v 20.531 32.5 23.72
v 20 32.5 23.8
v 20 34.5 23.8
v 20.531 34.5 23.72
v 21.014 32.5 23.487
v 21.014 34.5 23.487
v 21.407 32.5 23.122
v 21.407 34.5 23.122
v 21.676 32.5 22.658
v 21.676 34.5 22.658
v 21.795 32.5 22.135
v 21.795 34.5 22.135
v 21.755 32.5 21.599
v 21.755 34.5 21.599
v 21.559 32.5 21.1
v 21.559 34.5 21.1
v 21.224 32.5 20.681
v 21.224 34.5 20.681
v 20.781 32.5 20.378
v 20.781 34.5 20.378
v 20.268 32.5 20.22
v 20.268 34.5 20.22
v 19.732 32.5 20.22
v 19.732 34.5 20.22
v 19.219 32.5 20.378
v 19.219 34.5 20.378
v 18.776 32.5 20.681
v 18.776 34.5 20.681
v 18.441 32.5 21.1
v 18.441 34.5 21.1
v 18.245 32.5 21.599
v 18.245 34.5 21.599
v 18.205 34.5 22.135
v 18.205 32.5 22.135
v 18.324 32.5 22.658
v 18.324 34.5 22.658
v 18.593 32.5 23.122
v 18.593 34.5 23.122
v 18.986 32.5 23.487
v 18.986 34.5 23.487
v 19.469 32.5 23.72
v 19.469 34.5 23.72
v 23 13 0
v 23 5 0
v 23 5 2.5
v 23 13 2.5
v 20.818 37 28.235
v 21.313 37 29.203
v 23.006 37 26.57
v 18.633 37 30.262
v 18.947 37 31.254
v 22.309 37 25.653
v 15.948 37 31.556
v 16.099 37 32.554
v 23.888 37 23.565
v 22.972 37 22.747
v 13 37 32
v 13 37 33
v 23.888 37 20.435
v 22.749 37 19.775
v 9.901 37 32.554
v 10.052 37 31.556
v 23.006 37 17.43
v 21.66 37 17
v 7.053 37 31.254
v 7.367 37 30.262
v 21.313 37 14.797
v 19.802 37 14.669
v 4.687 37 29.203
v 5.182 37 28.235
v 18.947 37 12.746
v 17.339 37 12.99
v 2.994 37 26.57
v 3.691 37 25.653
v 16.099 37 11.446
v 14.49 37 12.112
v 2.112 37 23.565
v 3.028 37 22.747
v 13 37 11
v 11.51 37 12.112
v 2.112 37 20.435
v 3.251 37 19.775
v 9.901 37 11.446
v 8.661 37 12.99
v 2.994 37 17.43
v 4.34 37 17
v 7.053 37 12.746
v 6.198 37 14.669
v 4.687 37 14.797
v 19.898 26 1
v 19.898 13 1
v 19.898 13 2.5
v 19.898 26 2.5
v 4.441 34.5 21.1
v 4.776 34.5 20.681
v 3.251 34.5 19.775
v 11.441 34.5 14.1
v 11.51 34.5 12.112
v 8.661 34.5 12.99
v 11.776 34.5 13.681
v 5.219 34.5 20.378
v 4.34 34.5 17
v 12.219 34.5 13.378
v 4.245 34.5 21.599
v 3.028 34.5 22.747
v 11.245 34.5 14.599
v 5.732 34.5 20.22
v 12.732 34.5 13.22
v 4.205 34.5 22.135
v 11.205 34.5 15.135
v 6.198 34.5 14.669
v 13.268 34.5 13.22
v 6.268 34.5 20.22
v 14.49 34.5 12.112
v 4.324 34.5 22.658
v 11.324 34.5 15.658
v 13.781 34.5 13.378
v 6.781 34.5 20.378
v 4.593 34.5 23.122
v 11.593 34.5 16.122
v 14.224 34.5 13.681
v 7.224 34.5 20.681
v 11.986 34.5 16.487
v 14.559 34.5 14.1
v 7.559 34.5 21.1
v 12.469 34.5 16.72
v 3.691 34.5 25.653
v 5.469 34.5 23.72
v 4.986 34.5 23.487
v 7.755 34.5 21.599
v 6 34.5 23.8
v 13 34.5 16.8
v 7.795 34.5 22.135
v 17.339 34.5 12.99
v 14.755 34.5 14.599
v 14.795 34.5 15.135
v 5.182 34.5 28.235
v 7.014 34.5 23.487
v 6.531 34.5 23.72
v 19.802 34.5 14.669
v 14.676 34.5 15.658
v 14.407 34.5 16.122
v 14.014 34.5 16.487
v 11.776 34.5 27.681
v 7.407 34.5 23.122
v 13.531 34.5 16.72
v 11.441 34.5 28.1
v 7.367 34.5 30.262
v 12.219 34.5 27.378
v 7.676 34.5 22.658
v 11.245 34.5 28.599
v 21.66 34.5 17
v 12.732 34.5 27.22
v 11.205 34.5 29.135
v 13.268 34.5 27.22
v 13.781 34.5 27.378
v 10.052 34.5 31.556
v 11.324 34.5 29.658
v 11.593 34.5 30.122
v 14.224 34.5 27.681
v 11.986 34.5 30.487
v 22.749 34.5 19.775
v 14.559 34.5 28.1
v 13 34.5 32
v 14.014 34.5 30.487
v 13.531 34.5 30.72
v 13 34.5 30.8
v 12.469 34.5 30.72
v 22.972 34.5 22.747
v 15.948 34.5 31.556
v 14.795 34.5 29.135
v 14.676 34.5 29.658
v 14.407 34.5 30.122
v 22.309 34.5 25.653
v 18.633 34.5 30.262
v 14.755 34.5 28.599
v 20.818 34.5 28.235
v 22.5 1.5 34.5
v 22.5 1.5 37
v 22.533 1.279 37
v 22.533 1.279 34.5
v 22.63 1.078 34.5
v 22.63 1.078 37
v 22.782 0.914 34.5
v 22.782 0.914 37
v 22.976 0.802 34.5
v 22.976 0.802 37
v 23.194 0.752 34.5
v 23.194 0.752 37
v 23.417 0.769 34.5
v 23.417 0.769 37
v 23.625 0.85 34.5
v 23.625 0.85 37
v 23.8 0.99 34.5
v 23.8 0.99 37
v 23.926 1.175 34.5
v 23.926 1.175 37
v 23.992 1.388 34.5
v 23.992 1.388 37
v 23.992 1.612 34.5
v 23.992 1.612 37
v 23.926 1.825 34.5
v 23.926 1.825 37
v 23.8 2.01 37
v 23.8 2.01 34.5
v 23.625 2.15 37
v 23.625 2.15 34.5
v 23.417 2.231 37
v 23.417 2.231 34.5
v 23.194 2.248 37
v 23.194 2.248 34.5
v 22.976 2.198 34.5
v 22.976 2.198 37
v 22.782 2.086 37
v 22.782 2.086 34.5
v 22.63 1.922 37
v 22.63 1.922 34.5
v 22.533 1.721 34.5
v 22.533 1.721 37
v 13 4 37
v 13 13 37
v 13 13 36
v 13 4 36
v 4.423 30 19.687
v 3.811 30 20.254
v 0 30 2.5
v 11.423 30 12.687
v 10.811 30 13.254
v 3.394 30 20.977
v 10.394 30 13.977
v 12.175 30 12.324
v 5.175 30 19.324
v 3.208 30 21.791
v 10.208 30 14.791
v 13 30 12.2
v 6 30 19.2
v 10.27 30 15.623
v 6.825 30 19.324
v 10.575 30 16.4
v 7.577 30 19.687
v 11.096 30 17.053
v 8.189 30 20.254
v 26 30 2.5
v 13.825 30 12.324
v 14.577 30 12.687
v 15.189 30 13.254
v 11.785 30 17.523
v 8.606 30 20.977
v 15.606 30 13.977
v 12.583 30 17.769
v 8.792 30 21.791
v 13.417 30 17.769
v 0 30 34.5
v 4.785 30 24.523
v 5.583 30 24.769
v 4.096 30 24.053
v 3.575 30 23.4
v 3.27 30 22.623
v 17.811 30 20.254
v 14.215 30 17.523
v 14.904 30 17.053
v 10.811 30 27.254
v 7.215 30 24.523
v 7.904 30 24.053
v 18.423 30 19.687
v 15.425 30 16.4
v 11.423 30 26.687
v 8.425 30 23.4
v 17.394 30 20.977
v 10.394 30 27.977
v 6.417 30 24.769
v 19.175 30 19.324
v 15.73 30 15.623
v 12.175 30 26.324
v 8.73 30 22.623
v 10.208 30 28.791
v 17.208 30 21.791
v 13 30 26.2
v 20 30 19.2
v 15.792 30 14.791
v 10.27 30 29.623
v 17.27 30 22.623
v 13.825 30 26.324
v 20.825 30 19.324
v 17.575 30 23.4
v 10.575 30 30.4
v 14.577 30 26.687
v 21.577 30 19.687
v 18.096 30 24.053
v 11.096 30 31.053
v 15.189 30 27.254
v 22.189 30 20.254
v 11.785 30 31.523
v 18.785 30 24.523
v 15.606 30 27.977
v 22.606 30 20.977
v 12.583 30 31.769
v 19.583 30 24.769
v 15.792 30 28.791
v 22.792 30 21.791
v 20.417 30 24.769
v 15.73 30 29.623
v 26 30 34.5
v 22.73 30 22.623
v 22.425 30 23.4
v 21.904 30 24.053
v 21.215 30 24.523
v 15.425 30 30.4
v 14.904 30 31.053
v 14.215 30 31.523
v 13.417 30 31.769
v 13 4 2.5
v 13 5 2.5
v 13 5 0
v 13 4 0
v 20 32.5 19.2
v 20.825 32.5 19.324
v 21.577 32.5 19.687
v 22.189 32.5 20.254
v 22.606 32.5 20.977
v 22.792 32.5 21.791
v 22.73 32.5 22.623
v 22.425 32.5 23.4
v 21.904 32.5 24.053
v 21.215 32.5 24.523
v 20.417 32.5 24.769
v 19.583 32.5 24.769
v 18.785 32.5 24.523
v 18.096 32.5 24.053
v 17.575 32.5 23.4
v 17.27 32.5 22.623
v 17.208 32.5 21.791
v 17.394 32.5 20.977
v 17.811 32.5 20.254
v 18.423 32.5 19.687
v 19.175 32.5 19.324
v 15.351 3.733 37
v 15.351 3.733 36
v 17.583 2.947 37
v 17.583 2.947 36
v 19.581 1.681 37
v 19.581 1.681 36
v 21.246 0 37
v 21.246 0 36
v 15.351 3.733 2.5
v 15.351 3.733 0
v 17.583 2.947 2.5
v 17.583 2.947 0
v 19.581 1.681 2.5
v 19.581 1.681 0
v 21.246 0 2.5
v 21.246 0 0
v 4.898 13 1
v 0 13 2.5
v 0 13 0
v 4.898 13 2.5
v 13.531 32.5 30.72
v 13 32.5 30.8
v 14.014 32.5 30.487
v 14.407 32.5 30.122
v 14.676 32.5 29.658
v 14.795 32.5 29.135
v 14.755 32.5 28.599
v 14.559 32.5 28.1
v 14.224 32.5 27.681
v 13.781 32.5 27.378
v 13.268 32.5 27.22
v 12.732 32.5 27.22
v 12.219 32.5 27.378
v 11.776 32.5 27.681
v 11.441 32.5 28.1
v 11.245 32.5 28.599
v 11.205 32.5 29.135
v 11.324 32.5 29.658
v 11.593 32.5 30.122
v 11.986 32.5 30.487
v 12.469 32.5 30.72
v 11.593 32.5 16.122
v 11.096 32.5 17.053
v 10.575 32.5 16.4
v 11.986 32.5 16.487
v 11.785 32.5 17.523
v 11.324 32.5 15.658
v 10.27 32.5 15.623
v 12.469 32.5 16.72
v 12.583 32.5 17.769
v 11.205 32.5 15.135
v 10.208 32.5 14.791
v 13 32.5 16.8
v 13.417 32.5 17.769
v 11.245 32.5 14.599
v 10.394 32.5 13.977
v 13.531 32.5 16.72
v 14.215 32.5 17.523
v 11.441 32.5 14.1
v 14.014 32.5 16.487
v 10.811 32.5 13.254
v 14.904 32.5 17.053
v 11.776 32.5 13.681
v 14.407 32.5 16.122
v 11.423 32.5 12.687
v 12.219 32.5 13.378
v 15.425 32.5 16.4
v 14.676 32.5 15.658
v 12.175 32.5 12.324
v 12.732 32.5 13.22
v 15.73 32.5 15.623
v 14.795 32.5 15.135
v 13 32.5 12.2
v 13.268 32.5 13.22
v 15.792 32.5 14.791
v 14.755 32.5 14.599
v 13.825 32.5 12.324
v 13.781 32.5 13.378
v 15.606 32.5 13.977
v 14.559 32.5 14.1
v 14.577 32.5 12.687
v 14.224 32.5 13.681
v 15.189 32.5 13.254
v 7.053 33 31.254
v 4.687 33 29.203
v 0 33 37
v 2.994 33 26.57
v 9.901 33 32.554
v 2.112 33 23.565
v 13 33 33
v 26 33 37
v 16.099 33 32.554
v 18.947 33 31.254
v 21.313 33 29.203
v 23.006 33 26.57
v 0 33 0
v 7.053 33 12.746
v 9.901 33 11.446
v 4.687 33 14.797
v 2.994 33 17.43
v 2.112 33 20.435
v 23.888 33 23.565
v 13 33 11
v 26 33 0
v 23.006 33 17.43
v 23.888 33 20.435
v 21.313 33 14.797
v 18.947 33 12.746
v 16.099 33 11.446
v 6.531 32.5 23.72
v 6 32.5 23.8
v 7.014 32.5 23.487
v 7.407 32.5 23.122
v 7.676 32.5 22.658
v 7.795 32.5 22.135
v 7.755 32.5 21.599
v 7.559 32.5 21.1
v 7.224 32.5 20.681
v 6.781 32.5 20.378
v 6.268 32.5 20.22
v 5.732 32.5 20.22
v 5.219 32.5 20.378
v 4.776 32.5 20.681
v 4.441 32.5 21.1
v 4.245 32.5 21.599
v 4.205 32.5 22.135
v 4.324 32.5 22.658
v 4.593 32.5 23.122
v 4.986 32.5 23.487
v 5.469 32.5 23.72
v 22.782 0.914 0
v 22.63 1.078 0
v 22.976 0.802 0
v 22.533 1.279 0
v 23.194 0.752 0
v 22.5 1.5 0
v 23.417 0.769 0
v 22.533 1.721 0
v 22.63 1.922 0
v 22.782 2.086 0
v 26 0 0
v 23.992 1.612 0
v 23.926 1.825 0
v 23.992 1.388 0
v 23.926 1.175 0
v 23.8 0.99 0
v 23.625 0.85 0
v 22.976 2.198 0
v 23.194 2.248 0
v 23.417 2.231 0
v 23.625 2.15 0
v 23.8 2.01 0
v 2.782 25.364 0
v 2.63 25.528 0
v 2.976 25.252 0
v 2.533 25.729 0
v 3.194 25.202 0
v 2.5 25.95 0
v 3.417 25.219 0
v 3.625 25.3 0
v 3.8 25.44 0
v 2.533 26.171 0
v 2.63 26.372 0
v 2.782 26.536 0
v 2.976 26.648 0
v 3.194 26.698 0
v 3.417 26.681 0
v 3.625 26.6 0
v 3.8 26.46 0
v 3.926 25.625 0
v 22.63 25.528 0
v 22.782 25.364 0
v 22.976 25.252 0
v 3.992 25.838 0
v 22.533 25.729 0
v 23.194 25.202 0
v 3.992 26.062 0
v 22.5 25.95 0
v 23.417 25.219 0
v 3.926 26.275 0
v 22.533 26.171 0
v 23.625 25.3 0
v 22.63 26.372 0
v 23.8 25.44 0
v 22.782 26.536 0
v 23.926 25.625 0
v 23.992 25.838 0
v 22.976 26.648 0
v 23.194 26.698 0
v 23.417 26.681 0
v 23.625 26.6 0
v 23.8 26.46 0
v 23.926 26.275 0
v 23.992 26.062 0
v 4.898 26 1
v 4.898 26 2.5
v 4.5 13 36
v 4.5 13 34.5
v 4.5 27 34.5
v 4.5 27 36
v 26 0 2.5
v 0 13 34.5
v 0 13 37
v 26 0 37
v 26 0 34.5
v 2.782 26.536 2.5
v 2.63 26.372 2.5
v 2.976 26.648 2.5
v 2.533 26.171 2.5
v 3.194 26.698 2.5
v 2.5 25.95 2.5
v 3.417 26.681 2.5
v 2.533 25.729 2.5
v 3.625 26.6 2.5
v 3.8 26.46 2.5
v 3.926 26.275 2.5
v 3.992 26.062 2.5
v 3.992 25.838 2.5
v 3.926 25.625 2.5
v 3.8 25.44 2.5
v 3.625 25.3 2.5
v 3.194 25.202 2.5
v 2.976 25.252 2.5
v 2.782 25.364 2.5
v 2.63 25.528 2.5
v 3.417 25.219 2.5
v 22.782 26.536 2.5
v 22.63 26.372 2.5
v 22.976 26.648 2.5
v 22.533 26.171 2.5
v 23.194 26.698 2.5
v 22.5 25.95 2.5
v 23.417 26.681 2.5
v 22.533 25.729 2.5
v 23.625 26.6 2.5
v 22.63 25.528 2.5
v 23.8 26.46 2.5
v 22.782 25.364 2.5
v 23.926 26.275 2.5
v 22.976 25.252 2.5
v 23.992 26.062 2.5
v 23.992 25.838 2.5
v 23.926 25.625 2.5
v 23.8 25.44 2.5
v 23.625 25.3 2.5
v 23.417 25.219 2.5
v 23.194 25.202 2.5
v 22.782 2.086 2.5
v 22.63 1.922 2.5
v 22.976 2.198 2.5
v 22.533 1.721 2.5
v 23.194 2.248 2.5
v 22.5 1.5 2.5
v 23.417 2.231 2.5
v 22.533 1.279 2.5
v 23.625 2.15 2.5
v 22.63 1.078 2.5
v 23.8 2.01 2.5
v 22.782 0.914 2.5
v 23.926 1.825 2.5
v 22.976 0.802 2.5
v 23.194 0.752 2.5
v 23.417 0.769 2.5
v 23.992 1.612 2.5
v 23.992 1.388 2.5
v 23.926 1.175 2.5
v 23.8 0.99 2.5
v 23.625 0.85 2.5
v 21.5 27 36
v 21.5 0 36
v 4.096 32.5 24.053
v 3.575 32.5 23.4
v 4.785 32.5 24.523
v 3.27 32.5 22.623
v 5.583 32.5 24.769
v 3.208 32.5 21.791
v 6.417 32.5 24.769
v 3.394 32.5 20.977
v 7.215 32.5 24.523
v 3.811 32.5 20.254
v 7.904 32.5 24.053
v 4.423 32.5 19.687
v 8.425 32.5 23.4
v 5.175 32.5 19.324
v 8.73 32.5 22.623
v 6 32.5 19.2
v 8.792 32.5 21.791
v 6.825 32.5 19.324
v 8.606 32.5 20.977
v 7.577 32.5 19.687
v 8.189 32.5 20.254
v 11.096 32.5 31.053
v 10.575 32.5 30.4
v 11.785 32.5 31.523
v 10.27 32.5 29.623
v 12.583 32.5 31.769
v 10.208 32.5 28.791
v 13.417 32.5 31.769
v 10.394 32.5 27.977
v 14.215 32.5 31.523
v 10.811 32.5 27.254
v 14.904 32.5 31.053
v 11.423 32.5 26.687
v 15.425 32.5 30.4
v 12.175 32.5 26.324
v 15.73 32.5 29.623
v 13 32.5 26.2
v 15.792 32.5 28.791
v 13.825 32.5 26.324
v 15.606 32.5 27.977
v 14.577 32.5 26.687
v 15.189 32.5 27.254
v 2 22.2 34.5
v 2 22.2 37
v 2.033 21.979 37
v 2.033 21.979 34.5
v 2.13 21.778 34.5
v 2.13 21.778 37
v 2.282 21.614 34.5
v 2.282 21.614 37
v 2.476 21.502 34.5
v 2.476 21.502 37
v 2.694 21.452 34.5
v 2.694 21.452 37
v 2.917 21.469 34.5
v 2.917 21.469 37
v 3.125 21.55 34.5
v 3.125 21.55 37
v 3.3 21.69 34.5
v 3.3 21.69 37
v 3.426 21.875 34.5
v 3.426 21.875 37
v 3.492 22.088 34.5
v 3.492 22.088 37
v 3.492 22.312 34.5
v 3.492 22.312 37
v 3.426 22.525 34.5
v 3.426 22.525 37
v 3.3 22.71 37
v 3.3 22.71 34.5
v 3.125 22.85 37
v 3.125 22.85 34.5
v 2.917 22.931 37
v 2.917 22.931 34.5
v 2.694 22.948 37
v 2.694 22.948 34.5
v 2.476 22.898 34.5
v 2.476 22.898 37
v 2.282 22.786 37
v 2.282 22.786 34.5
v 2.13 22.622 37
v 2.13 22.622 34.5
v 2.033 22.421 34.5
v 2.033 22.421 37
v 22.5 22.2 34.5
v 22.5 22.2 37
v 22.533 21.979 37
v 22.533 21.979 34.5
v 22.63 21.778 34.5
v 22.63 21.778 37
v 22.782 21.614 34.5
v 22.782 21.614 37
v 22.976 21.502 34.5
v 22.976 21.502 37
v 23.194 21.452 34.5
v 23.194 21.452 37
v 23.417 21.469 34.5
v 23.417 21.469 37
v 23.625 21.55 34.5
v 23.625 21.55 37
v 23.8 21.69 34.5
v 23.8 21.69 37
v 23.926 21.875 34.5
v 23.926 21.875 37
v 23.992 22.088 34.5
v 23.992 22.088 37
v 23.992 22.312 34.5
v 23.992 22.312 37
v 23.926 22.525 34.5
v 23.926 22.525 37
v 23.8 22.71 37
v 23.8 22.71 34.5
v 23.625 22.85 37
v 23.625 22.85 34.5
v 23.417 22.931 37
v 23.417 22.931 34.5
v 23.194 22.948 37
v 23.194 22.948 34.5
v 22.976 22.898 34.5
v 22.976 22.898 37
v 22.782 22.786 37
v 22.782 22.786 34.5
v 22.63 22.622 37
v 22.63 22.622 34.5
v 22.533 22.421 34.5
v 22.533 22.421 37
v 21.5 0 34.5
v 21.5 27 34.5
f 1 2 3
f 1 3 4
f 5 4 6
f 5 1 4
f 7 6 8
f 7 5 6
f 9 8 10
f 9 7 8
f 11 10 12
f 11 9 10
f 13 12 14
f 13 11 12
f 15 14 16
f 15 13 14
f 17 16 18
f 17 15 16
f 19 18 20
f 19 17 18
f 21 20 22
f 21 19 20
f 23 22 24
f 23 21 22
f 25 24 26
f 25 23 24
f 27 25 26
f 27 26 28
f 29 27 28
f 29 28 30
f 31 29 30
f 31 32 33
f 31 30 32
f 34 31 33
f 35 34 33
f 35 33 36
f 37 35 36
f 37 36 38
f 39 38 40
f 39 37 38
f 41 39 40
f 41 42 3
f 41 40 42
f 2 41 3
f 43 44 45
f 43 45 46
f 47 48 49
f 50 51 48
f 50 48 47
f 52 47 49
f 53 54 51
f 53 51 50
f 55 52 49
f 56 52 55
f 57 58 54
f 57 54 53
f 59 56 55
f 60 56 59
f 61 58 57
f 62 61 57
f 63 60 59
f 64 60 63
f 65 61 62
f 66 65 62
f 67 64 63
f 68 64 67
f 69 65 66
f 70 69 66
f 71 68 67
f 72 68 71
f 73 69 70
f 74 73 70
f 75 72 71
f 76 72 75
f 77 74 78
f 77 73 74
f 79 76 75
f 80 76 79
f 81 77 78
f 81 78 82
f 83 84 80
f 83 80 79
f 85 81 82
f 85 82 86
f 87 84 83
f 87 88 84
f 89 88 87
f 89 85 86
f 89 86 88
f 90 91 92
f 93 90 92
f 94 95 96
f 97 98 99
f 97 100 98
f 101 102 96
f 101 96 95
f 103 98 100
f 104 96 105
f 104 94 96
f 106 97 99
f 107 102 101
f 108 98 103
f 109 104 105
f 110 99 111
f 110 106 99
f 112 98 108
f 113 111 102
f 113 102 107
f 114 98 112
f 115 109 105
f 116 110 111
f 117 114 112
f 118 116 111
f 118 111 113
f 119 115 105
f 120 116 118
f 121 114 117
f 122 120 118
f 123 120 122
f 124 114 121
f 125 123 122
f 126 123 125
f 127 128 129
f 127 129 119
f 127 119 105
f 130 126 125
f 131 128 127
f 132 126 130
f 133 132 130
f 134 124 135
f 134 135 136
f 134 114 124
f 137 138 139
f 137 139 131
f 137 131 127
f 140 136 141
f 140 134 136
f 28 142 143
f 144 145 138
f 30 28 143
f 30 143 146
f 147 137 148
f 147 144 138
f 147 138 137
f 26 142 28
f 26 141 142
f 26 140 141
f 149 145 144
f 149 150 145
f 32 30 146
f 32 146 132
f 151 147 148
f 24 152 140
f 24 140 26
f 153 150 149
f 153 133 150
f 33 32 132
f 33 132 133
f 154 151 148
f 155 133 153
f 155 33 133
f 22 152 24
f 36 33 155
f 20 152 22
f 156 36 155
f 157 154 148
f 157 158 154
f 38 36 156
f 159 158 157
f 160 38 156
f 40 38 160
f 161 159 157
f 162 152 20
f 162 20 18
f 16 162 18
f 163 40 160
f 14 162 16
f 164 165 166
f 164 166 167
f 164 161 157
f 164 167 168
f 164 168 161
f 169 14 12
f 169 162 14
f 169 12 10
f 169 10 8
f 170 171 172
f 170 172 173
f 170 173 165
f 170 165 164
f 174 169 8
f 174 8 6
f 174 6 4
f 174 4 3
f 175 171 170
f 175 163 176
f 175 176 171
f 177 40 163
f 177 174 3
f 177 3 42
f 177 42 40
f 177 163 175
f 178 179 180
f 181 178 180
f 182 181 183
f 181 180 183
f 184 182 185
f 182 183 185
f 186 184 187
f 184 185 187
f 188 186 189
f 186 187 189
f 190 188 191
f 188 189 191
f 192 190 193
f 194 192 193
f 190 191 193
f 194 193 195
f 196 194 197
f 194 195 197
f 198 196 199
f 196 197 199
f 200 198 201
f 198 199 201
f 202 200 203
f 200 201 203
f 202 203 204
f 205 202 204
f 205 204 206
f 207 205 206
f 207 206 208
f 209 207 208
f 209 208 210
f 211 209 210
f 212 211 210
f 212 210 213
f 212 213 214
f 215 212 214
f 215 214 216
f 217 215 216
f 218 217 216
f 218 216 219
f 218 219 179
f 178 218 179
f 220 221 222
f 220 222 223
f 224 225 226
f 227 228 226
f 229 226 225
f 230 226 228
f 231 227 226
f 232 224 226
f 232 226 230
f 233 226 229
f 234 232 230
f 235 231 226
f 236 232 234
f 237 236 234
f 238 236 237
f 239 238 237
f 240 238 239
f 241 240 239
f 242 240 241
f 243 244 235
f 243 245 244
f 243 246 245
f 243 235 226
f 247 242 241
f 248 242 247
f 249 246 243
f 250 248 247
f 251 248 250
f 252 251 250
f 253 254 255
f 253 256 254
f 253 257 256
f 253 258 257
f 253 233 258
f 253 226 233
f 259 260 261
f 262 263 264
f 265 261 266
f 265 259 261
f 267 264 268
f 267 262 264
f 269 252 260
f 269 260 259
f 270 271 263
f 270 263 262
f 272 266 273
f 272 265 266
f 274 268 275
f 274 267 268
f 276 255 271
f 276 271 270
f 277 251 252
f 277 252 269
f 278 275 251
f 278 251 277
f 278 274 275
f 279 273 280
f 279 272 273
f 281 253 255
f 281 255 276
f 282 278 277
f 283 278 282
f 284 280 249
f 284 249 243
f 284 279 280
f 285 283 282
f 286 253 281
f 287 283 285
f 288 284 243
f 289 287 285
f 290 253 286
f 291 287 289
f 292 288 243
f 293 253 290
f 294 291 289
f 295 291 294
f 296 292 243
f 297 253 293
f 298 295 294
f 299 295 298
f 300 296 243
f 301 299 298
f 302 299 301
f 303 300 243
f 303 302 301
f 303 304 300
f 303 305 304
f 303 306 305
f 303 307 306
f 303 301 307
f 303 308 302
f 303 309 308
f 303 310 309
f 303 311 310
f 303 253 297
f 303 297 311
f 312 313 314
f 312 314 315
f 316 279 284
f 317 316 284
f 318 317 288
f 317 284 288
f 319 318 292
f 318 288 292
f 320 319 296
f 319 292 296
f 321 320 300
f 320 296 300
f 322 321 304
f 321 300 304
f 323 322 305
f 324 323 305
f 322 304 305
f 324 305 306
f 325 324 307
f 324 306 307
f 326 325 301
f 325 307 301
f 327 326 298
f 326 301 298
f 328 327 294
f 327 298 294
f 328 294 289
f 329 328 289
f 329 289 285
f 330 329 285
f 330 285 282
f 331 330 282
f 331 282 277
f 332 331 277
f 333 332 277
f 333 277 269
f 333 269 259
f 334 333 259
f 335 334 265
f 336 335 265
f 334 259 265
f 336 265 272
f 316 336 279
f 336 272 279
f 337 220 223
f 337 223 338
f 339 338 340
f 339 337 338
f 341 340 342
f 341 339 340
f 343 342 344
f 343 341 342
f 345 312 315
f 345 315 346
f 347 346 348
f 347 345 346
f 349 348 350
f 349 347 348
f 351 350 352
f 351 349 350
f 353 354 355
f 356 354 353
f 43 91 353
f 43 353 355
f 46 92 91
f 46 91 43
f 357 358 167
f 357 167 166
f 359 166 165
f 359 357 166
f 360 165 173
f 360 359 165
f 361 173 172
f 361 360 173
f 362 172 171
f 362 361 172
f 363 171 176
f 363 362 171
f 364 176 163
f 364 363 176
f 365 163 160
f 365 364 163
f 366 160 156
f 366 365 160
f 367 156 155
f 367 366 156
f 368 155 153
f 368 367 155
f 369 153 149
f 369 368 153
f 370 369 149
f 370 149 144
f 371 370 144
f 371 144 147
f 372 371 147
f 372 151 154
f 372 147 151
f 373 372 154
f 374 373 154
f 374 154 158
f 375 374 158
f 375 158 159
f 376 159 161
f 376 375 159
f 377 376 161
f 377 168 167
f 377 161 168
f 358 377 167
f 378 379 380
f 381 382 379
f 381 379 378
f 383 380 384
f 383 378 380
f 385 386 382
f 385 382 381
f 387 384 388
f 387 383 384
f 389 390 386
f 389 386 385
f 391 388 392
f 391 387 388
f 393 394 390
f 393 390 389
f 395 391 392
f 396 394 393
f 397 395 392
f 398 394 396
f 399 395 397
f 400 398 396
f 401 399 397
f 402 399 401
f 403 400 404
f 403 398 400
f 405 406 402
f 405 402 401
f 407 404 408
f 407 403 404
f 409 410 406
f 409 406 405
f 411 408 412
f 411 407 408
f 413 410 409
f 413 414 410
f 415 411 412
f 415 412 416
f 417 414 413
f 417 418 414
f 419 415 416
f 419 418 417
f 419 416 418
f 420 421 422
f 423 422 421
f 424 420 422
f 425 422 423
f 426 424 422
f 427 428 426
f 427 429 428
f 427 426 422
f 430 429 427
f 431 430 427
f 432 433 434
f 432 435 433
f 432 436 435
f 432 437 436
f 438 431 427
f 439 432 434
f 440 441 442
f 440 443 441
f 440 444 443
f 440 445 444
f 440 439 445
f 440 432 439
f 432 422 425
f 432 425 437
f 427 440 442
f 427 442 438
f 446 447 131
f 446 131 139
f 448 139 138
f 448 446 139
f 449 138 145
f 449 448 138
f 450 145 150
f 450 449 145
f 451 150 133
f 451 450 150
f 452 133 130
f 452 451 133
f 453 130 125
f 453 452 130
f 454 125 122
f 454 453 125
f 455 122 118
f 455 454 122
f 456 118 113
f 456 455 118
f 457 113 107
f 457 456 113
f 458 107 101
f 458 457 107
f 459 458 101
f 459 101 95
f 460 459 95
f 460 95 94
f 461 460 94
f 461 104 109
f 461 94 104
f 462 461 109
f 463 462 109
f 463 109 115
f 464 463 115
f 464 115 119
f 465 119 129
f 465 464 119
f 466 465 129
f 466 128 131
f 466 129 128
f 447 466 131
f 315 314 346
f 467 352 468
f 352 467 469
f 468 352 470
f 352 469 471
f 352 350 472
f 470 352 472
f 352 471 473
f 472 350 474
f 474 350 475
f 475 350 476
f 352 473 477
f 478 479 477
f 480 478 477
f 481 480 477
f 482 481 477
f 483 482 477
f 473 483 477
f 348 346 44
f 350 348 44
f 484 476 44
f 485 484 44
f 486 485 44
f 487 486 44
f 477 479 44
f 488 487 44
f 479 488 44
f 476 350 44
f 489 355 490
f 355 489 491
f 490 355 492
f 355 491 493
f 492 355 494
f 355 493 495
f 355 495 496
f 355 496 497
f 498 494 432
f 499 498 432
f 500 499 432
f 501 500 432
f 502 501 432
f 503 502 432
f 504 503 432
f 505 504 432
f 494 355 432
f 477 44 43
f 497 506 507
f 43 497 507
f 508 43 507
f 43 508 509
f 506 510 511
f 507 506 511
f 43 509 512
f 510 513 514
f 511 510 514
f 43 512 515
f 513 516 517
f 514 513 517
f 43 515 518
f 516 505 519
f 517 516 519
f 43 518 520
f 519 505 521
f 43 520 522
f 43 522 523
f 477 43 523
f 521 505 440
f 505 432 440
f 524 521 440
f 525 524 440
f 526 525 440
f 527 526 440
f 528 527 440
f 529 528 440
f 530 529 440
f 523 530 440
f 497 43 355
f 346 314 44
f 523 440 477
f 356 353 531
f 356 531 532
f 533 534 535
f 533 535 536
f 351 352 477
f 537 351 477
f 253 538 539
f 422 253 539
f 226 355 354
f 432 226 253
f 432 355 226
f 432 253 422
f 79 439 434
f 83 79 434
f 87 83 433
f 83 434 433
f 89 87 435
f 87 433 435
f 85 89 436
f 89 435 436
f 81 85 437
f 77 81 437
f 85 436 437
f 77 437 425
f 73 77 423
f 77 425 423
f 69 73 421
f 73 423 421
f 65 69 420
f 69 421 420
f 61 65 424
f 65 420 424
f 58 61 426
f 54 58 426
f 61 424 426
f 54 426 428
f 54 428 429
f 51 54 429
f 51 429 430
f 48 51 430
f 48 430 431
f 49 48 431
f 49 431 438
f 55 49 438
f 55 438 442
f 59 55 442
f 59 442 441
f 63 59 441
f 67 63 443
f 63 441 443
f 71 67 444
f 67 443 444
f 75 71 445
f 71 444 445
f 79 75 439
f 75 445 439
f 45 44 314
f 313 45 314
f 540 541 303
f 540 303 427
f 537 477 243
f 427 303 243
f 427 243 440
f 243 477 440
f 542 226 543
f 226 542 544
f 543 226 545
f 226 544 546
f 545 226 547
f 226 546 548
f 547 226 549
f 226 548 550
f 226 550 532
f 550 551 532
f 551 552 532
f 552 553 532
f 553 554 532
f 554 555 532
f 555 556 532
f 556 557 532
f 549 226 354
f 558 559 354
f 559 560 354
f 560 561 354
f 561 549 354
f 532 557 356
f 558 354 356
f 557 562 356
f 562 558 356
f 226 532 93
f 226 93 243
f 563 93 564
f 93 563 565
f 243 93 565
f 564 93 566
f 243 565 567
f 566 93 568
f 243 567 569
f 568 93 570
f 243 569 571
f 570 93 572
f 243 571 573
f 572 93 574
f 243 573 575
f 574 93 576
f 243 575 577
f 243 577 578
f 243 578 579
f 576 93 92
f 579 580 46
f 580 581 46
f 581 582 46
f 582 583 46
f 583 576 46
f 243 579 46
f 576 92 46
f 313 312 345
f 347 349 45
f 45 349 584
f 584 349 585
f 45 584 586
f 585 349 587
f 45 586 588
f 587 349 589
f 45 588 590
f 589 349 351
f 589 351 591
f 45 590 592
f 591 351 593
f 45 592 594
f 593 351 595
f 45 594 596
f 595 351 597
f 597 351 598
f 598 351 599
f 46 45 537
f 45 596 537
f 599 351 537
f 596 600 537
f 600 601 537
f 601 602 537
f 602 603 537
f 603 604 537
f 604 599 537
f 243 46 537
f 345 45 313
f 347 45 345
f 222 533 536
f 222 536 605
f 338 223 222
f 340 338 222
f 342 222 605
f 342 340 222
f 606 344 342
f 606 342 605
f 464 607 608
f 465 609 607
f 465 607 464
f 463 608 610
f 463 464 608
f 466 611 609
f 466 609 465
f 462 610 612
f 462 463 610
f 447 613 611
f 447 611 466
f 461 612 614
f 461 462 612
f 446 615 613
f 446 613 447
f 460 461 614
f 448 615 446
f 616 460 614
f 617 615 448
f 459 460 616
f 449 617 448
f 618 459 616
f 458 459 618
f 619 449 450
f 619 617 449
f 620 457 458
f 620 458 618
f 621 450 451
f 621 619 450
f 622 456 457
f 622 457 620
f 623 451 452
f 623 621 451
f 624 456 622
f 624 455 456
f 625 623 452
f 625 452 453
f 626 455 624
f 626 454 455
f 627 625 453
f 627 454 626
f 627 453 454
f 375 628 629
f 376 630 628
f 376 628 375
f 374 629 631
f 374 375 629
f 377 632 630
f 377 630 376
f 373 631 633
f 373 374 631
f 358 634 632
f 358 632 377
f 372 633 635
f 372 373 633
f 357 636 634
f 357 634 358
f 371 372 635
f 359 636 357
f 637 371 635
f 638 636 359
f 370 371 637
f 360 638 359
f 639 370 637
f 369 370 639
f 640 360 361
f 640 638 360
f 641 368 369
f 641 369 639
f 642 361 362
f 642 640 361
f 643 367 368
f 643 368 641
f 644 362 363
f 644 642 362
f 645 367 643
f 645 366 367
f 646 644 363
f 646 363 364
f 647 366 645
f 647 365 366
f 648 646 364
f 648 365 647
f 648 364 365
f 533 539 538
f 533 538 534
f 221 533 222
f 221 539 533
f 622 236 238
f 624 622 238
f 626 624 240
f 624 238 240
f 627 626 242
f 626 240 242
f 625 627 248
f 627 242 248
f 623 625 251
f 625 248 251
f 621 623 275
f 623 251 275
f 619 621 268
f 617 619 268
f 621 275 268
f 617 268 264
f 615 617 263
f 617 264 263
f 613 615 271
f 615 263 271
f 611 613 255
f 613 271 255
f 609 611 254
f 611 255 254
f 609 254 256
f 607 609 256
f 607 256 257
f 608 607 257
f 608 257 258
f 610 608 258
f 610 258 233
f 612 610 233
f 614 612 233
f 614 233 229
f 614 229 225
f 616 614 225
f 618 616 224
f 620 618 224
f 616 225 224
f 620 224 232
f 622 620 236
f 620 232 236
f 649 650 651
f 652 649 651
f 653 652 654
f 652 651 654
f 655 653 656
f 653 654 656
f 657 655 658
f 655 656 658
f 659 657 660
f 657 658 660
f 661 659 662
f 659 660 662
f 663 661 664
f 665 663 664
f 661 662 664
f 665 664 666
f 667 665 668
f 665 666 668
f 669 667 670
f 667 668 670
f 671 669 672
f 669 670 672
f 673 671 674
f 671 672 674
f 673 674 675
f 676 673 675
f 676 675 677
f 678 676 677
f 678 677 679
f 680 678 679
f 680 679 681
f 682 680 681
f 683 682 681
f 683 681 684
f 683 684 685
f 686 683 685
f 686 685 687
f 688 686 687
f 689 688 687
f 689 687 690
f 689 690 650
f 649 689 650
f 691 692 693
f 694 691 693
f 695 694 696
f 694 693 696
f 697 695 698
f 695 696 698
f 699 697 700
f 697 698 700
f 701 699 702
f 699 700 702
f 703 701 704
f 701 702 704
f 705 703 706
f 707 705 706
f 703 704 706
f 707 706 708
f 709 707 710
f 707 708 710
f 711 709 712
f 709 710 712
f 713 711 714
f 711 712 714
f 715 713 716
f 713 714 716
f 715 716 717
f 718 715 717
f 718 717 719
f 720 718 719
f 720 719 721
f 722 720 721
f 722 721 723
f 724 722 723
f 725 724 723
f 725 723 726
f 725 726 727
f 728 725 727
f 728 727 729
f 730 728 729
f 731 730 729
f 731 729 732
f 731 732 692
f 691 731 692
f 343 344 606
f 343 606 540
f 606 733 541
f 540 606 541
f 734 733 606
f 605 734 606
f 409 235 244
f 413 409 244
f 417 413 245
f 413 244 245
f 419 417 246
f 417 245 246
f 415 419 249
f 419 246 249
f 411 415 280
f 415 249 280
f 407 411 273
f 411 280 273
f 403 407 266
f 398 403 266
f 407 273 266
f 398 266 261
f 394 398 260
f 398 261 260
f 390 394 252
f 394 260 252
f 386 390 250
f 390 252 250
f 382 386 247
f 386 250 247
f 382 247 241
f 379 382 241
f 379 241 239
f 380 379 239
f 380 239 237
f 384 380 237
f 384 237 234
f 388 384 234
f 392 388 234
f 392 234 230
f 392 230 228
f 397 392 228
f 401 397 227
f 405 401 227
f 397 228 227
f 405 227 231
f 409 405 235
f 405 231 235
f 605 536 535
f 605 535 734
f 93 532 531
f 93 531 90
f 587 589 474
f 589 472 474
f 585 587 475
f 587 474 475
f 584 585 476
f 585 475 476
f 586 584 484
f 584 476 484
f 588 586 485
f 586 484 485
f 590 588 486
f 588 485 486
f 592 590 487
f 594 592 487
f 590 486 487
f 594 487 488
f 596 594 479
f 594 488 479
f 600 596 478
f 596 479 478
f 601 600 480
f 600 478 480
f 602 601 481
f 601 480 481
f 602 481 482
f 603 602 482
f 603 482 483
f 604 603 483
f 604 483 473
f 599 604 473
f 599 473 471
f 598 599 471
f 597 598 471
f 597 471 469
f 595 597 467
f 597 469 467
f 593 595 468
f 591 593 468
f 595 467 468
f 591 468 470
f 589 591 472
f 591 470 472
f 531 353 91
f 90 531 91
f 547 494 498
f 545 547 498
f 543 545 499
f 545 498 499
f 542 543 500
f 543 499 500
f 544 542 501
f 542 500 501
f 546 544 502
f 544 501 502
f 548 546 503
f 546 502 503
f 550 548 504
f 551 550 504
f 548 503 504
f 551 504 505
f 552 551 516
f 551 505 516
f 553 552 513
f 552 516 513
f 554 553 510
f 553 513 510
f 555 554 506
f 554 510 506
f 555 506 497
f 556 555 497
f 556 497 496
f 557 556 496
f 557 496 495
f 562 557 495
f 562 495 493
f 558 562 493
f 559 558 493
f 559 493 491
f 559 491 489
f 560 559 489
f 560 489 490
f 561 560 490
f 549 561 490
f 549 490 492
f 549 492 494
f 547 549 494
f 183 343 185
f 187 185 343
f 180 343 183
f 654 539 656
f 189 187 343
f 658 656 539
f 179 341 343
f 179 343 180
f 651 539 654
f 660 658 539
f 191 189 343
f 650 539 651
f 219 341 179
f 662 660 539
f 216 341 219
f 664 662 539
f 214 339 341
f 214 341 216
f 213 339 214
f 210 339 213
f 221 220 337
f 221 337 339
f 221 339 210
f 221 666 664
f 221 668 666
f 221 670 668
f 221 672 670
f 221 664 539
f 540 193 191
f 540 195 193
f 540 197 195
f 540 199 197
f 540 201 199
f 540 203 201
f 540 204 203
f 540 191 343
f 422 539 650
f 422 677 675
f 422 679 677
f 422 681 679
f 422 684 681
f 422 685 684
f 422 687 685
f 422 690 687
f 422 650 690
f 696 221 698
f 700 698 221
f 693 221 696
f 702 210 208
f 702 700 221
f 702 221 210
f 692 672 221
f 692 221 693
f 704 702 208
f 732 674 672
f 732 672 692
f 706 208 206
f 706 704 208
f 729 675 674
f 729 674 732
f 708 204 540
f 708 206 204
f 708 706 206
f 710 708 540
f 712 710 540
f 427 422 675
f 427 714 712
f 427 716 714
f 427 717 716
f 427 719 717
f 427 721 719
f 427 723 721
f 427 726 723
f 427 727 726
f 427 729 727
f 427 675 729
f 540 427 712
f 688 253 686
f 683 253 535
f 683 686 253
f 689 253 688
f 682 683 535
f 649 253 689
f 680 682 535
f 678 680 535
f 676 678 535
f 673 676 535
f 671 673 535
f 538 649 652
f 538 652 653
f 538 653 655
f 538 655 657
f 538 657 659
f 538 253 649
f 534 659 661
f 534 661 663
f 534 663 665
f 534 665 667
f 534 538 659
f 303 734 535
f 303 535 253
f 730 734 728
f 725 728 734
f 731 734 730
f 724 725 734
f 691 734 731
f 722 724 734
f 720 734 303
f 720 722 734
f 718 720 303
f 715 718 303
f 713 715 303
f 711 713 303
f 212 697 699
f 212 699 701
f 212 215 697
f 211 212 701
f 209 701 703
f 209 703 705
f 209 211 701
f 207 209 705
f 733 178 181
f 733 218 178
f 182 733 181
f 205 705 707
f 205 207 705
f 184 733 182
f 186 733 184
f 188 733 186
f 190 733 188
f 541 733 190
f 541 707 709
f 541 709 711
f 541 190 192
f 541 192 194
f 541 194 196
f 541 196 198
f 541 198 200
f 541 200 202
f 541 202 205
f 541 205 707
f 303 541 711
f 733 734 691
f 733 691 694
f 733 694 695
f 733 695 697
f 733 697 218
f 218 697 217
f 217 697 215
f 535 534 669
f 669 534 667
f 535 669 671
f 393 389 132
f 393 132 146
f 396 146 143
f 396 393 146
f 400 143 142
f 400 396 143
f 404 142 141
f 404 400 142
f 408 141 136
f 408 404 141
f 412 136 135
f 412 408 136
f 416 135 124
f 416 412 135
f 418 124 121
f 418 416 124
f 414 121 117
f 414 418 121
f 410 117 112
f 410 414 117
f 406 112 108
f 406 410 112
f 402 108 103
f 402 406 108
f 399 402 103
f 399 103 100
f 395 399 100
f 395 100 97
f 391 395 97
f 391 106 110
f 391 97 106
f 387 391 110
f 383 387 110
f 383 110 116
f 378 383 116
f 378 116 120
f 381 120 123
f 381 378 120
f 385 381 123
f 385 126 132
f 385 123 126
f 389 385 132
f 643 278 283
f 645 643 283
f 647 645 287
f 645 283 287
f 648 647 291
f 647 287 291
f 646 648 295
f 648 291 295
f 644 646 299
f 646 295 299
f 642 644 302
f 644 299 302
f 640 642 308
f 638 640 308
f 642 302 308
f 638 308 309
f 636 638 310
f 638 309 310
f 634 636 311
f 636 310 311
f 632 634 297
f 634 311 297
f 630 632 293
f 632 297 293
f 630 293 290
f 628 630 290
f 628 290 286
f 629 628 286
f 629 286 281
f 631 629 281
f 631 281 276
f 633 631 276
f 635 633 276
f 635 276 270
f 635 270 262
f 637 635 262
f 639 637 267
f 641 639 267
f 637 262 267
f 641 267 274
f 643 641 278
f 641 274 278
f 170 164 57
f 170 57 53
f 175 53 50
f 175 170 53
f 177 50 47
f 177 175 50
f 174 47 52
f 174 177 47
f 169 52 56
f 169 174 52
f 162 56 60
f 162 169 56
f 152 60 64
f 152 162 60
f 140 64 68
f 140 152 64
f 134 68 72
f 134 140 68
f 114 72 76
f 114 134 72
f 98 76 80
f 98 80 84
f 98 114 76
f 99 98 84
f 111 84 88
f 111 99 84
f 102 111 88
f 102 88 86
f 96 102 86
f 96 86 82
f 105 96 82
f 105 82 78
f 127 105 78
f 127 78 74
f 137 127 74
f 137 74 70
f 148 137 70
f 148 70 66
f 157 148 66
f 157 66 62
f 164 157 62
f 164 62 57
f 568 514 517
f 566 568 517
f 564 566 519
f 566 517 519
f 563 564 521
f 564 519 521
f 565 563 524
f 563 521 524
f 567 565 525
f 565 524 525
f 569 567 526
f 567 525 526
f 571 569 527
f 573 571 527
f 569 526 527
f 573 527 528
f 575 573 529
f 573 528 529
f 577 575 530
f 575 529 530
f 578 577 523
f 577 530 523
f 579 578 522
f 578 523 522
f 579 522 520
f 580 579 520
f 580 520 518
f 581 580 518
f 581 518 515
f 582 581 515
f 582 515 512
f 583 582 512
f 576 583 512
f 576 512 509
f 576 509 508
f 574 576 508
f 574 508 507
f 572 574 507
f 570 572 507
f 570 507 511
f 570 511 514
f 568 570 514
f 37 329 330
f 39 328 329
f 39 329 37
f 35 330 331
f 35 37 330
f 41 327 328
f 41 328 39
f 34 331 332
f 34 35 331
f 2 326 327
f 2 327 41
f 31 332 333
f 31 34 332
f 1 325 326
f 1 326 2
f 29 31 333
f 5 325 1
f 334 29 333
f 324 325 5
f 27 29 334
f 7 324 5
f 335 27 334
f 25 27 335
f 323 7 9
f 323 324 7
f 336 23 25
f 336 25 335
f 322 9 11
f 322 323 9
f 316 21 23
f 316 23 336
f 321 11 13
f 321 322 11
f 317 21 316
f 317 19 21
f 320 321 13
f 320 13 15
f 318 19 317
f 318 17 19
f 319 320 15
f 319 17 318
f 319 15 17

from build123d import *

# Parameters (mm, degrees)
SKETCH_1_W                      = 26
SKETCH_1_H                      = 33
EXTRUDE_1_DEPTH                 = 37
SKETCH_3_W                      = 26
SKETCH_3_H                      = 32
CUT_EXTRUDE_1_DEPTH             = 30
CUT_EXTRUDE_2_REACH             = 57.982
SKETCH_2_R                      = 0.75
CUT_EXTRUDE_2_DIRECTION_2_DEPTH = 56.982140009
CUT_EXTRUDE_3_REACH             = 57.982
SKETCH_4_R                      = 0.75
SKETCH_5_W                      = 17
SKETCH_5_H                      = 1.5
CUT_EXTRUDE_4_DEPTH             = 27
CUT_EXTRUDE_5_REACH             = 57.982
SKETCH_6_W                      = 20
SKETCH_6_H                      = 8
CUT_EXTRUDE_START               = -37
CUT_EXTRUDE_6_OUTLINE_R         = 0.75
CUT_EXTRUDE_6_DEPTH             = 37
SKETCH_8_W                      = 15
SKETCH_8_H                      = 1.5
CUT_EXTRUDE_7_DEPTH             = 13
SKETCH_9_R                      = 11
SKETCH_9_R_2                    = 10
EXTRUDE_2_DEPTH                 = 4
SKETCH_12_R                     = 10
EXTRUDE_3_DEPTH                 = 1.5
CUT_EXTRUDE_8_DEPTH             = 56.982140009
CUT_EXTRUDE_8_DEPTH_BACK        = 56.982140009
SKETCH_10_R                     = 1.8
SKETCH_11_R                     = 2.8
CUT_EXTRUDE_9_DEPTH             = 2.5


# Read off the part's stored shape, not the designer's step: 切除-拉伸6
with BuildPart() as part:
    # 草图1 → 凸台-拉伸1 (new body)
    with BuildSketch(Plane.XY):
        with Locations((13, 16.5)):
            Rectangle(SKETCH_1_W, SKETCH_1_H)
    extrude(amount=EXTRUDE_1_DEPTH)

    # 草图3 → 切除-拉伸1 (cut)
    with BuildSketch(Plane.XZ):
        with Locations((13, 18.5)):
            Rectangle(SKETCH_3_W, SKETCH_3_H)
    extrude(amount=-CUT_EXTRUDE_1_DEPTH, mode=Mode.SUBTRACT)

    # 草图2 → 切除-拉伸2 (cut, up to next)
    with BuildSketch(Plane.XY.offset(37), mode=Mode.PRIVATE) as cut_extrude_2_sk1:
        with Locations(Location((2.75, 1.5, 0), (0, 0, 180))):
            Circle(SKETCH_2_R)
    cut_extrude_2_tool1 = extrude(cut_extrude_2_sk1.sketch, amount=-CUT_EXTRUDE_2_REACH, mode=Mode.PRIVATE) & part.part
    # 草图2 → 切除-拉伸2 (cut, up to next)
    with BuildSketch(Plane.XY.offset(37), mode=Mode.PRIVATE) as cut_extrude_2_sk2:
        with Locations(Location((23.25, 1.5, 0), (0, 0, 180))):
            Circle(SKETCH_2_R)
    cut_extrude_2_tool2 = extrude(cut_extrude_2_sk2.sketch, amount=-CUT_EXTRUDE_2_REACH, mode=Mode.PRIVATE) & part.part
    # 草图2 → 切除-拉伸2 (cut, up to next)
    with BuildSketch(Plane.XY.offset(37), mode=Mode.PRIVATE) as cut_extrude_2_sk3:
        with Locations(Location((23.25, 22.2, 0), (0, 0, 180))):
            Circle(SKETCH_2_R)
    cut_extrude_2_tool3 = extrude(cut_extrude_2_sk3.sketch, amount=-CUT_EXTRUDE_2_REACH, mode=Mode.PRIVATE) & part.part
    # 草图2 → 切除-拉伸2 (cut, up to next)
    with BuildSketch(Plane.XY.offset(37), mode=Mode.PRIVATE) as cut_extrude_2_sk4:
        with Locations(Location((2.75, 22.2, 0), (0, 0, 180))):
            Circle(SKETCH_2_R)
    cut_extrude_2_tool4 = extrude(cut_extrude_2_sk4.sketch, amount=-CUT_EXTRUDE_2_REACH, mode=Mode.PRIVATE) & part.part
    add(cut_extrude_2_tool1.solids().sort_by_distance((2.75, 1.5, 37))[0], mode=Mode.SUBTRACT)
    add(cut_extrude_2_tool2.solids().sort_by_distance((23.25, 1.5, 37))[0], mode=Mode.SUBTRACT)
    add(cut_extrude_2_tool3.solids().sort_by_distance((23.25, 22.2, 37))[0], mode=Mode.SUBTRACT)
    add(cut_extrude_2_tool4.solids().sort_by_distance((2.75, 22.2, 37))[0], mode=Mode.SUBTRACT)

    # 草图2 → 切除-拉伸2 direction 2 (cut)
    with BuildSketch(Plane.XY.offset(37)):
        with Locations(Location((2.75, 1.5, 0), (0, 0, 180))):
            Circle(SKETCH_2_R)
        with Locations(Location((23.25, 1.5, 0), (0, 0, 180))):
            Circle(SKETCH_2_R)
        with Locations(Location((23.25, 22.2, 0), (0, 0, 180))):
            Circle(SKETCH_2_R)
        with Locations(Location((2.75, 22.2, 0), (0, 0, 180))):
            Circle(SKETCH_2_R)
    extrude(amount=CUT_EXTRUDE_2_DIRECTION_2_DEPTH, mode=Mode.SUBTRACT)

    # 草图4 → 切除-拉伸3 (cut, up to next)
    with BuildSketch(Plane(origin=(0, 0, 0), x_dir=(-1, 0, 0), z_dir=(0, 0, -1)), mode=Mode.PRIVATE) as cut_extrude_3_sk1:
        with Locations((-2.75, 1.5)):
            Circle(SKETCH_4_R)
    cut_extrude_3_tool1 = extrude(cut_extrude_3_sk1.sketch, amount=-CUT_EXTRUDE_3_REACH, mode=Mode.PRIVATE) & part.part
    # 草图4 → 切除-拉伸3 (cut, up to next)
    with BuildSketch(Plane(origin=(0, 0, 0), x_dir=(-1, 0, 0), z_dir=(0, 0, -1)), mode=Mode.PRIVATE) as cut_extrude_3_sk2:
        with Locations((-23.25, 1.5)):
            Circle(SKETCH_4_R)
    cut_extrude_3_tool2 = extrude(cut_extrude_3_sk2.sketch, amount=-CUT_EXTRUDE_3_REACH, mode=Mode.PRIVATE) & part.part
    # 草图4 → 切除-拉伸3 (cut, up to next)
    with BuildSketch(Plane(origin=(0, 0, 0), x_dir=(-1, 0, 0), z_dir=(0, 0, -1)), mode=Mode.PRIVATE) as cut_extrude_3_sk3:
        with Locations((-23.25, 25.95)):
            Circle(SKETCH_4_R)
    cut_extrude_3_tool3 = extrude(cut_extrude_3_sk3.sketch, amount=-CUT_EXTRUDE_3_REACH, mode=Mode.PRIVATE) & part.part
    # 草图4 → 切除-拉伸3 (cut, up to next)
    with BuildSketch(Plane(origin=(0, 0, 0), x_dir=(-1, 0, 0), z_dir=(0, 0, -1)), mode=Mode.PRIVATE) as cut_extrude_3_sk4:
        with Locations((-3.25, 25.95)):
            Circle(SKETCH_4_R)
    cut_extrude_3_tool4 = extrude(cut_extrude_3_sk4.sketch, amount=-CUT_EXTRUDE_3_REACH, mode=Mode.PRIVATE) & part.part
    add(cut_extrude_3_tool1.solids().sort_by_distance((2.75, 1.5, 0))[0], mode=Mode.SUBTRACT)
    add(cut_extrude_3_tool2.solids().sort_by_distance((23.25, 1.5, 0))[0], mode=Mode.SUBTRACT)
    add(cut_extrude_3_tool3.solids().sort_by_distance((23.25, 25.95, 0))[0], mode=Mode.SUBTRACT)
    add(cut_extrude_3_tool4.solids().sort_by_distance((3.25, 25.95, 0))[0], mode=Mode.SUBTRACT)

    # 草图5 → 切除-拉伸4 (cut)
    with BuildSketch(Plane.XZ):
        with Locations((13, 35.25)):
            Rectangle(SKETCH_5_W, SKETCH_5_H)
    extrude(amount=-CUT_EXTRUDE_4_DEPTH, mode=Mode.SUBTRACT)

    # 草图6 → 切除-拉伸5 (cut, up to next)
    with BuildSketch(Plane(origin=(0, 0, 0), x_dir=(-1, 0, 0), z_dir=(0, 0, -1)), mode=Mode.PRIVATE) as cut_extrude_5_sk1:
        with Locations((-13, 9)):
            Rectangle(SKETCH_6_W, SKETCH_6_H)
    cut_extrude_5_tool1 = extrude(cut_extrude_5_sk1.sketch, amount=-CUT_EXTRUDE_5_REACH, mode=Mode.PRIVATE) & part.part
    add(cut_extrude_5_tool1.solids().sort_by_distance((13, 9, 0))[0], mode=Mode.SUBTRACT)

    # 切除-拉伸6 outline → 切除-拉伸6 (cut)
    with BuildSketch(Plane(origin=(0, 0, 0), x_dir=(-1, 0, 0), z_dir=(0, 0, -1)).offset(CUT_EXTRUDE_START)):
        with BuildLine():
            Line((0, 0), (0, 13))
            Line((0, 13), (-13, 13))
            Line((-13, 13), (-13, 4))
            ThreePointArc((-13, 4), (-17.582575695, 2.947221814), (-21.246211251, 0))
            Line((-21.246211251, 0), (0, 0))
        make_face()
        with Locations((-2.75, 1.5)):
            Circle(CUT_EXTRUDE_6_OUTLINE_R, mode=Mode.SUBTRACT)
    extrude(amount=CUT_EXTRUDE_6_DEPTH, mode=Mode.SUBTRACT)

    # 草图8 → 切除-拉伸7 (cut)
    with BuildSketch(Plane.XZ.offset(-13)):
        with Locations((12.397702636, 1.75)):
            Rectangle(SKETCH_8_W, SKETCH_8_H)
    extrude(amount=-CUT_EXTRUDE_7_DEPTH, mode=Mode.SUBTRACT)

    # 草图9 → 凸台-拉伸2 (add)
    with BuildSketch(Plane(origin=(0, 33, 0), x_dir=(1, 0, 0), z_dir=(0, 1, 0))):
        with Locations(Location((13, -22, 0), (0, 0, 90))):
            Circle(SKETCH_9_R)
        with Locations(Location((13, -22, 0), (0, 0, 270))):
            Circle(SKETCH_9_R_2, mode=Mode.SUBTRACT)
    extrude(amount=EXTRUDE_2_DEPTH)

    # 草图12 → 凸台-拉伸3 (add)
    with BuildSketch(Plane(origin=(0, 33, 0), x_dir=(1, 0, 0), z_dir=(0, 1, 0))):
        with Locations(Location((13, -22, 0), (0, 0, 270))):
            Circle(SKETCH_12_R)
    extrude(amount=EXTRUDE_3_DEPTH)

    # 草图10 → 切除-拉伸8 (cut, two sides: drawn at the far end of the back side and taken through both)
    with BuildSketch(Plane(origin=(0, 33, 0), x_dir=(1, 0, 0), z_dir=(0, 1, 0)).offset(-CUT_EXTRUDE_8_DEPTH_BACK)):
        with Locations(Location((13, -15, 0), (0, 0, 270))):
            Circle(SKETCH_10_R)
        with Locations(Location((20, -22, 0), (0, 0, 270))):
            Circle(SKETCH_10_R)
        with Locations(Location((13, -29, 0), (0, 0, 270))):
            Circle(SKETCH_10_R)
        with Locations(Location((6, -22, 0), (0, 0, 270))):
            Circle(SKETCH_10_R)
    extrude(amount=CUT_EXTRUDE_8_DEPTH + CUT_EXTRUDE_8_DEPTH_BACK, mode=Mode.SUBTRACT)

    # 草图11 → 切除-拉伸9 (cut)
    with BuildSketch(Plane.XZ.offset(-30)):
        with Locations(Location((6, 22, 0), (0, 0, 270))):
            Circle(SKETCH_11_R)
        with Locations(Location((13, 29, 0), (0, 0, 270))):
            Circle(SKETCH_11_R)
        with Locations(Location((20, 22, 0), (0, 0, 270))):
            Circle(SKETCH_11_R)
        with Locations(Location((13, 15, 0), (0, 0, 270))):
            Circle(SKETCH_11_R)
    extrude(amount=-CUT_EXTRUDE_9_DEPTH, mode=Mode.SUBTRACT)


solid = part.part
